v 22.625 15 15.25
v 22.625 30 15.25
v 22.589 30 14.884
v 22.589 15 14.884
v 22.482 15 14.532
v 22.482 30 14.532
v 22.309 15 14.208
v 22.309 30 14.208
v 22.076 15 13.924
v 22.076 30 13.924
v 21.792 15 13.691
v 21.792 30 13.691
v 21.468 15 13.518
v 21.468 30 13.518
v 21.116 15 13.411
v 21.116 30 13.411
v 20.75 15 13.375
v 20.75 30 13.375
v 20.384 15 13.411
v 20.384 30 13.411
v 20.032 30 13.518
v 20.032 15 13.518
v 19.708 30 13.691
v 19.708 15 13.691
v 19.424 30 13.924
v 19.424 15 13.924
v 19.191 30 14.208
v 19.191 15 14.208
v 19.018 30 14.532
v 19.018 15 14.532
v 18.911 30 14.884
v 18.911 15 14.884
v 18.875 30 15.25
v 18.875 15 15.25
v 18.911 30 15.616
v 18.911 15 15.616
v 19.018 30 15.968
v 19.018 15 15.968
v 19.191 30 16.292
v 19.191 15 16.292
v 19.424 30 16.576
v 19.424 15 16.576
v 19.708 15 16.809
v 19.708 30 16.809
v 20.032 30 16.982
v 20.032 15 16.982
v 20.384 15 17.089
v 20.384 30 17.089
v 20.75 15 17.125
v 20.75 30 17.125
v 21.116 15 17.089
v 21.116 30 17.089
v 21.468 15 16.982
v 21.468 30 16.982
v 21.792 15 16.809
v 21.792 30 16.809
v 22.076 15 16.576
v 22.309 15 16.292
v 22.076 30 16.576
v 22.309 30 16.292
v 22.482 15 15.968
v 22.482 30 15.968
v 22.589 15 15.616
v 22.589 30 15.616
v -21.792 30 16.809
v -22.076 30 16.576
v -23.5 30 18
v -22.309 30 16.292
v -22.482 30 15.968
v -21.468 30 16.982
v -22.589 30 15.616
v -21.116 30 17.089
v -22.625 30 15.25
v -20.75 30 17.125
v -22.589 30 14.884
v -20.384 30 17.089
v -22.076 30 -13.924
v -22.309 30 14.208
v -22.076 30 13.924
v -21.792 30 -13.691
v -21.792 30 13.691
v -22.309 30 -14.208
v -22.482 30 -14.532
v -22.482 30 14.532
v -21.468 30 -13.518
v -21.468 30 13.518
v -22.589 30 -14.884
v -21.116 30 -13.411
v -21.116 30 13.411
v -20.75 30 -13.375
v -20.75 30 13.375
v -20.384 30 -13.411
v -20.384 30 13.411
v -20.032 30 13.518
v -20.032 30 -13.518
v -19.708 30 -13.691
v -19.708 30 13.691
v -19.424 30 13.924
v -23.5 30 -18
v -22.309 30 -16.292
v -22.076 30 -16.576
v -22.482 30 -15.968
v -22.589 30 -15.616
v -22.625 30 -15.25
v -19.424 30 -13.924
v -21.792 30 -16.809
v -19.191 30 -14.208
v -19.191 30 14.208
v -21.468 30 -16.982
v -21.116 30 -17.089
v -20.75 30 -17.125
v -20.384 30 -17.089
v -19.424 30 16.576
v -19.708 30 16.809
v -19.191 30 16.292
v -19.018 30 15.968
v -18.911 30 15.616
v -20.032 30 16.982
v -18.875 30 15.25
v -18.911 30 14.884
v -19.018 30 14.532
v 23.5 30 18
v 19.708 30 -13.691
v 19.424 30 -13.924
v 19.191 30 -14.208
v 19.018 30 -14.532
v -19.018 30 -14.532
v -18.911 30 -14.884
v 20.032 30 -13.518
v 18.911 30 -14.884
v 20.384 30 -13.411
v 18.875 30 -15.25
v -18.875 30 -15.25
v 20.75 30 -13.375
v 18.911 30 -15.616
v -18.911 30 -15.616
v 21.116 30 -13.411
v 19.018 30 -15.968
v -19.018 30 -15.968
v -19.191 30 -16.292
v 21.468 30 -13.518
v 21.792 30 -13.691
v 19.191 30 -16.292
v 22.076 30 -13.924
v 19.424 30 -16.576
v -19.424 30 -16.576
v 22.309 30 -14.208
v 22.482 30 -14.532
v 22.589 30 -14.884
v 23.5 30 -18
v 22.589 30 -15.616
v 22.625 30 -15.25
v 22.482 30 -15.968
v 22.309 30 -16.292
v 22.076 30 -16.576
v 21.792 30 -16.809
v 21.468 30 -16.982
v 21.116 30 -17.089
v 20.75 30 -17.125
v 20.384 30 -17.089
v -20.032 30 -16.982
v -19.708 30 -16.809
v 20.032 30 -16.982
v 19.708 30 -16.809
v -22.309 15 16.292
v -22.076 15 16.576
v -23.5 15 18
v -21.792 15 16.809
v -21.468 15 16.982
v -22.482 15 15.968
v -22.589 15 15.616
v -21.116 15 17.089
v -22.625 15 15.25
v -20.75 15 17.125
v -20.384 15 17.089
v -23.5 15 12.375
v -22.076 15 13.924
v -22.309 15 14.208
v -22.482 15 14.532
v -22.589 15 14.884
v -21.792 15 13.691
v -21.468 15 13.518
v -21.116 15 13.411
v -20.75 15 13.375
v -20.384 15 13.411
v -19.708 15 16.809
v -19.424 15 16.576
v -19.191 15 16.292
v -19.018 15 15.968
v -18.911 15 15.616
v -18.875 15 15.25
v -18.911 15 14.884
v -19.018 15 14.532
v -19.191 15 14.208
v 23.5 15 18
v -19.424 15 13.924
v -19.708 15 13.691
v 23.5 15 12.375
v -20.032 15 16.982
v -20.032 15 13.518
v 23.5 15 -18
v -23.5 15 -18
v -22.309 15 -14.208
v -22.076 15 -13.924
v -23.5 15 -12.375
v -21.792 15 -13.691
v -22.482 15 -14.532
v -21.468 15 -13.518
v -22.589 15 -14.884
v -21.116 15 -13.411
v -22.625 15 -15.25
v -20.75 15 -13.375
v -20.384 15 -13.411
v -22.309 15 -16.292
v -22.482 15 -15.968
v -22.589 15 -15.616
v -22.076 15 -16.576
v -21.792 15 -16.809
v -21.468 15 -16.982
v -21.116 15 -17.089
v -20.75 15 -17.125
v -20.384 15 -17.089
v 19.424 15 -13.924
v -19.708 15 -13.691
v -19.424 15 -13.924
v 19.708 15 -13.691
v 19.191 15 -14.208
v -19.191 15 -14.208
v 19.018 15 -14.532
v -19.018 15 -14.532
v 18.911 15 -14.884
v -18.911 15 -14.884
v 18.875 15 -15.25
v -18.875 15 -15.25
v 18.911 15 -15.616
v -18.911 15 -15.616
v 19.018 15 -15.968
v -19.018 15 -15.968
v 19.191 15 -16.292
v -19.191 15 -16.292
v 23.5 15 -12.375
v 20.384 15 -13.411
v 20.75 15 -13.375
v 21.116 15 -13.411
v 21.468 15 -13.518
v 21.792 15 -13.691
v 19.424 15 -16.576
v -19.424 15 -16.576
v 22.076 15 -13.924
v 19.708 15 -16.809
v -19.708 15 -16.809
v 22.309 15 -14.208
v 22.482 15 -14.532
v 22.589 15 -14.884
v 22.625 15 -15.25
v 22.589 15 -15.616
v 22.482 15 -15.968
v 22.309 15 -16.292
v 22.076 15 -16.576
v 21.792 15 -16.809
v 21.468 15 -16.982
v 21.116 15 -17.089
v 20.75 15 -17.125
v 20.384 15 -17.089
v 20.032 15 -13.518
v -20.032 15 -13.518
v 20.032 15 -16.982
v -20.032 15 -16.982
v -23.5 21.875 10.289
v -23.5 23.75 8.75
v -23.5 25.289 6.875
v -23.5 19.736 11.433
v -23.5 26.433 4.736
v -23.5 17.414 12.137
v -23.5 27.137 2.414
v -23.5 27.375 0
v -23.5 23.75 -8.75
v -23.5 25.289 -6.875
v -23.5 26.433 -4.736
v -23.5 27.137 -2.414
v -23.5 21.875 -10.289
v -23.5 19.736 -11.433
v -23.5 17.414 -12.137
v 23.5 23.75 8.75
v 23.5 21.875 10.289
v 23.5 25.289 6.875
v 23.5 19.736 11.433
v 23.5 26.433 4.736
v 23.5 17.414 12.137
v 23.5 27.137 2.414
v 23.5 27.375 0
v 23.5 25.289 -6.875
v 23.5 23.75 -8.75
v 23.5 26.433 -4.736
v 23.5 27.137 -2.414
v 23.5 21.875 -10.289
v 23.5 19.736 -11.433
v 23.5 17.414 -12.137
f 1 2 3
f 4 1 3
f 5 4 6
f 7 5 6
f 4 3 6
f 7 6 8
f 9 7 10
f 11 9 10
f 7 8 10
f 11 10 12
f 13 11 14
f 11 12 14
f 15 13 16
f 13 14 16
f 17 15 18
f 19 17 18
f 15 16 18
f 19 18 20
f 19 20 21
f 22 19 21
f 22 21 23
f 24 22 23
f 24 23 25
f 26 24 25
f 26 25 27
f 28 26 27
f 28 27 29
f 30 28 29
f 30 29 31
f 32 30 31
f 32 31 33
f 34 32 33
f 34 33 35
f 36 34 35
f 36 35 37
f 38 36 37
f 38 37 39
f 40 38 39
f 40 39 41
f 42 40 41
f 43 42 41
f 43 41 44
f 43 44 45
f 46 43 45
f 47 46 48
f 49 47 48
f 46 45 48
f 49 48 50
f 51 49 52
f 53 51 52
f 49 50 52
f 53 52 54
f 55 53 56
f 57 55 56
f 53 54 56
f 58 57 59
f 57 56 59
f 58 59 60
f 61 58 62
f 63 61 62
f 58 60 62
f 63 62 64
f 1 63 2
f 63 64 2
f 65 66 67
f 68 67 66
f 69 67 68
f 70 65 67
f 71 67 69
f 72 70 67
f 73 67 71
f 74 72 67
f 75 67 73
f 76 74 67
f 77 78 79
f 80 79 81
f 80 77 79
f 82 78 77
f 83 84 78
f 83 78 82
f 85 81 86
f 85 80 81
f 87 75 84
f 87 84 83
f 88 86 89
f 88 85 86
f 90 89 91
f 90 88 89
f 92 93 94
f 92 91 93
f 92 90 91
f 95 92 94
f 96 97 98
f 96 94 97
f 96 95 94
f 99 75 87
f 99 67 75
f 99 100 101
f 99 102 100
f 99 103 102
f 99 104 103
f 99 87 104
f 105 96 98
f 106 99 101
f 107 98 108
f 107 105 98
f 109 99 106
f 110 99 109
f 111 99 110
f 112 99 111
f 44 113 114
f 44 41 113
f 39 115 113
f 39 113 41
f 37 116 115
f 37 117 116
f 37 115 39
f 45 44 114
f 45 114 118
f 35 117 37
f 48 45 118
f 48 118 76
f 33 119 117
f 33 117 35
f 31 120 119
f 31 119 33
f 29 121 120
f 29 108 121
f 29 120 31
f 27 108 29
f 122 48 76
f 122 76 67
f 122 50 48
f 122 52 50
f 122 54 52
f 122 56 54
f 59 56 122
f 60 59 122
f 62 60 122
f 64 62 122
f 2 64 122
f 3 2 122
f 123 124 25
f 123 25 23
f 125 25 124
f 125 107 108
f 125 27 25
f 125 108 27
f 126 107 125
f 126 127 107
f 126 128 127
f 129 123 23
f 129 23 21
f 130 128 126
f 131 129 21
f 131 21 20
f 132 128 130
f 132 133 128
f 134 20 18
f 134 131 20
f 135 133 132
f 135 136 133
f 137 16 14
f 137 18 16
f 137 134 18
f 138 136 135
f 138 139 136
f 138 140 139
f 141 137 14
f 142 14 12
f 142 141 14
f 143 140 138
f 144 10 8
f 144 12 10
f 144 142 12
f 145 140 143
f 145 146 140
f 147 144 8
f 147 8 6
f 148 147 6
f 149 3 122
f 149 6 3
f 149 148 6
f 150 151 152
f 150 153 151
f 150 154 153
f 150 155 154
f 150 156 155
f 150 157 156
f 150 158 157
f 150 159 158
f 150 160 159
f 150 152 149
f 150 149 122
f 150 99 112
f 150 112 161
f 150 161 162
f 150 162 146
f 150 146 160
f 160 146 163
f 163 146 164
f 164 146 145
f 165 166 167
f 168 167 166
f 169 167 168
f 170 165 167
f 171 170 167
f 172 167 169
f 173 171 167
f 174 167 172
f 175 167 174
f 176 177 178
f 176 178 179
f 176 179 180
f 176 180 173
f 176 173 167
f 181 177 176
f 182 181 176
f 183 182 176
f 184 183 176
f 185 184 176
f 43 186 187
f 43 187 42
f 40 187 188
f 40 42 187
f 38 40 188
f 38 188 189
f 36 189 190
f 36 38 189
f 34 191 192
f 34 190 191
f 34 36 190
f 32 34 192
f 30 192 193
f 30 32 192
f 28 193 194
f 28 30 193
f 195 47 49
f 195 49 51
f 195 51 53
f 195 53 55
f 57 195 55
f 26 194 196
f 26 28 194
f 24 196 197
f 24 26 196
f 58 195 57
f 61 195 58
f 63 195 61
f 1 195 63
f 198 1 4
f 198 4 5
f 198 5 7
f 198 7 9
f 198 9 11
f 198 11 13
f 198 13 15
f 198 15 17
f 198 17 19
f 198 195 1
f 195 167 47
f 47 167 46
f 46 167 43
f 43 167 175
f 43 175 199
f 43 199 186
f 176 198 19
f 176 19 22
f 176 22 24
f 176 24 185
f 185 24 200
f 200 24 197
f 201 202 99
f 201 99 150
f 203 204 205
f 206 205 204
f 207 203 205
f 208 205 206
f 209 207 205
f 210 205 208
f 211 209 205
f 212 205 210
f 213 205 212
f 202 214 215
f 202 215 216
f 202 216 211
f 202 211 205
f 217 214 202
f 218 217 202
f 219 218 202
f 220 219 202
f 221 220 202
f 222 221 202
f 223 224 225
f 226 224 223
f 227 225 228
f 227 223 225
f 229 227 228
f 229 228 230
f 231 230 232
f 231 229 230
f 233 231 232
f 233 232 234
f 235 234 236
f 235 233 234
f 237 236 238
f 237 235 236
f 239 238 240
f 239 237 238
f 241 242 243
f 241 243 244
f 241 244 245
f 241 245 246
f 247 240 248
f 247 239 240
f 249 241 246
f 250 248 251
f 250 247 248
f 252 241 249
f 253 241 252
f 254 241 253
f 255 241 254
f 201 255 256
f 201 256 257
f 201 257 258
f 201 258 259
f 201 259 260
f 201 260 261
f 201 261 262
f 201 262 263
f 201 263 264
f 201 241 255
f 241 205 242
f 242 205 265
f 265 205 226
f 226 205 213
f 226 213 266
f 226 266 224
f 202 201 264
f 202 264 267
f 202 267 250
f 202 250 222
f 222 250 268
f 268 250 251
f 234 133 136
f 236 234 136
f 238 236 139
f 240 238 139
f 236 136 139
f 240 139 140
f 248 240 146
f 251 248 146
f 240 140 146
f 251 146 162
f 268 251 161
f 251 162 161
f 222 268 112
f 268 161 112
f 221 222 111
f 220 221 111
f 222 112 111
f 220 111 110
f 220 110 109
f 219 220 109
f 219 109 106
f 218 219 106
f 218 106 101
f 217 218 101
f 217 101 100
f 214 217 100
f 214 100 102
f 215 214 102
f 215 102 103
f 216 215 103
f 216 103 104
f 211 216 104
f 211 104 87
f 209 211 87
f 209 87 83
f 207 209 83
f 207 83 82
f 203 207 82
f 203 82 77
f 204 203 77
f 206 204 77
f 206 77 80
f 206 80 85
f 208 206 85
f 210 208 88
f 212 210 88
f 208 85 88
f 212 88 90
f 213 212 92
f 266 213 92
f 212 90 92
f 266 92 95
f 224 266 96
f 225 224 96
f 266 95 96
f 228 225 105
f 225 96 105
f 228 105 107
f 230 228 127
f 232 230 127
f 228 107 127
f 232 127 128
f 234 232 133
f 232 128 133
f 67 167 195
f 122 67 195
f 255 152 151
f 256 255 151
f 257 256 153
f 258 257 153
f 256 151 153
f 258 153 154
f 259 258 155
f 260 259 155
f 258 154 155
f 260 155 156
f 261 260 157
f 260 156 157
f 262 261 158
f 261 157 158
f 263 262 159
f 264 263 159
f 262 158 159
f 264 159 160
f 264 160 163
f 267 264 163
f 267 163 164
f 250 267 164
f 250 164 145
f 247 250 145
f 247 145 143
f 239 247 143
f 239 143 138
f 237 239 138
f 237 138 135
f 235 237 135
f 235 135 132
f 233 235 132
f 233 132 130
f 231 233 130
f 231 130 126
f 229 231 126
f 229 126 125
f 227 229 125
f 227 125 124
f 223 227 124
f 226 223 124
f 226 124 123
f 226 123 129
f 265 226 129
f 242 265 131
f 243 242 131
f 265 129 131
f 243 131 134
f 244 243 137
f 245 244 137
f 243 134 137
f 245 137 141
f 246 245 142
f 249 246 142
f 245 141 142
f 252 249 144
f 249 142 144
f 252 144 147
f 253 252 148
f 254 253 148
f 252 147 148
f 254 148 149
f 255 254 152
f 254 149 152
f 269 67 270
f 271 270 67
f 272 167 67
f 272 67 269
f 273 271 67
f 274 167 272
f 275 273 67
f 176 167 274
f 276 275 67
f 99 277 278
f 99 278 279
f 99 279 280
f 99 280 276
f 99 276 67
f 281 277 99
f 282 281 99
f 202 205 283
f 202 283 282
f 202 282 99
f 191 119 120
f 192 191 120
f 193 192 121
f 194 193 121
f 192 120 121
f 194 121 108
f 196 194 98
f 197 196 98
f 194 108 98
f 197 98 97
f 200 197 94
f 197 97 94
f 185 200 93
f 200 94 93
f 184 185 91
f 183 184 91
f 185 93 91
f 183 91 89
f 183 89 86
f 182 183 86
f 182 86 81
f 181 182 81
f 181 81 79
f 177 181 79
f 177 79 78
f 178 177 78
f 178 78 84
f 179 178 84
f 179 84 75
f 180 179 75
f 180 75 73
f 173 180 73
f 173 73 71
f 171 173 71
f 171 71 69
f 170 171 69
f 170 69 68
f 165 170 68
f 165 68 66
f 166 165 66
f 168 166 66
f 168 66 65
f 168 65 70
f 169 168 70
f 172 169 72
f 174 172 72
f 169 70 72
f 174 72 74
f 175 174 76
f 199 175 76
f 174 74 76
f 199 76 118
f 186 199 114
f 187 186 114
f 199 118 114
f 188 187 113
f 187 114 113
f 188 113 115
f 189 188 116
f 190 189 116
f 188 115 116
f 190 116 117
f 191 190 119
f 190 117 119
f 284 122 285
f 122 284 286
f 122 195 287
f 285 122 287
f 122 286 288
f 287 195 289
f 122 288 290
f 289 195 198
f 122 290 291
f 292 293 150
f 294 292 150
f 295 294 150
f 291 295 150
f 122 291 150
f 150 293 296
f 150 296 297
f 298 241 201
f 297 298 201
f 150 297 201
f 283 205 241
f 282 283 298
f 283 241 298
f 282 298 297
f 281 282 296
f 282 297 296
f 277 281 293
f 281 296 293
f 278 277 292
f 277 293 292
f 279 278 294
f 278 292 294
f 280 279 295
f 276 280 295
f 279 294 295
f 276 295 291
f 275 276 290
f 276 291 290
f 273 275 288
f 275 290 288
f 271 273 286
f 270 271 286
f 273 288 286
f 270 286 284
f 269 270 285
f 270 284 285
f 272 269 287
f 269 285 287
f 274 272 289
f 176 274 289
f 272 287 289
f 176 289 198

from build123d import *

# Parameters (mm, degrees)
SKETCH1_W           = 47
SKETCH1_H           = 36
BOSS_EXTRUDE1_DEPTH = 30
SKETCH3_R           = 12.375
CUT_EXTRUDE1_DEPTH  = 47
SKETCH5_R           = 1.875
CUT_EXTRUDE2_DEPTH  = 40
CUT_EXTRUDE3_START  = 23.5
SKETCH7_W           = 36
SKETCH7_H           = 15
CUT_EXTRUDE3_DEPTH  = 48


with BuildPart() as part:
    # Sketch1 → Boss-Extrude1 (new body)
    with BuildSketch(Plane(origin=(0, 0, 0), x_dir=(1, 0, 0), z_dir=(0, 1, 0))):
        Rectangle(SKETCH1_W, SKETCH1_H)
    extrude(amount=BOSS_EXTRUDE1_DEPTH)

    # Sketch3 → Cut-Extrude1 (cut)
    with BuildSketch(Plane(origin=(23.5, 0, 0), x_dir=(0, 0, -1), z_dir=(1, 0, 0))):
        with Locations((0, 15)):
            Circle(SKETCH3_R)
    extrude(amount=-CUT_EXTRUDE1_DEPTH, mode=Mode.SUBTRACT)

    # Sketch5 → Cut-Extrude2 (cut)
    with BuildSketch(Plane(origin=(0, 30, 0), x_dir=(1, 0, 0), z_dir=(0, 1, 0))):
        with Locations((-20.75, 15.25)):
            Circle(SKETCH5_R)
        with Locations((-20.75, -15.25)):
            Circle(SKETCH5_R)
        with Locations((20.75, -15.25)):
            Circle(SKETCH5_R)
        with Locations((20.75, 15.25)):
            Circle(SKETCH5_R)
    extrude(amount=-CUT_EXTRUDE2_DEPTH, mode=Mode.SUBTRACT)

    # Sketch7 → Cut-Extrude3 (cut, through all)
    with BuildSketch(Plane(origin=(0, 0, 0), x_dir=(0, 0, -1), z_dir=(1, 0, 0)).offset(CUT_EXTRUDE3_START)):
        with Locations((0, 7.5)):
            Rectangle(SKETCH7_W, SKETCH7_H)
    extrude(amount=-CUT_EXTRUDE3_DEPTH, mode=Mode.SUBTRACT)


solid = part.part
